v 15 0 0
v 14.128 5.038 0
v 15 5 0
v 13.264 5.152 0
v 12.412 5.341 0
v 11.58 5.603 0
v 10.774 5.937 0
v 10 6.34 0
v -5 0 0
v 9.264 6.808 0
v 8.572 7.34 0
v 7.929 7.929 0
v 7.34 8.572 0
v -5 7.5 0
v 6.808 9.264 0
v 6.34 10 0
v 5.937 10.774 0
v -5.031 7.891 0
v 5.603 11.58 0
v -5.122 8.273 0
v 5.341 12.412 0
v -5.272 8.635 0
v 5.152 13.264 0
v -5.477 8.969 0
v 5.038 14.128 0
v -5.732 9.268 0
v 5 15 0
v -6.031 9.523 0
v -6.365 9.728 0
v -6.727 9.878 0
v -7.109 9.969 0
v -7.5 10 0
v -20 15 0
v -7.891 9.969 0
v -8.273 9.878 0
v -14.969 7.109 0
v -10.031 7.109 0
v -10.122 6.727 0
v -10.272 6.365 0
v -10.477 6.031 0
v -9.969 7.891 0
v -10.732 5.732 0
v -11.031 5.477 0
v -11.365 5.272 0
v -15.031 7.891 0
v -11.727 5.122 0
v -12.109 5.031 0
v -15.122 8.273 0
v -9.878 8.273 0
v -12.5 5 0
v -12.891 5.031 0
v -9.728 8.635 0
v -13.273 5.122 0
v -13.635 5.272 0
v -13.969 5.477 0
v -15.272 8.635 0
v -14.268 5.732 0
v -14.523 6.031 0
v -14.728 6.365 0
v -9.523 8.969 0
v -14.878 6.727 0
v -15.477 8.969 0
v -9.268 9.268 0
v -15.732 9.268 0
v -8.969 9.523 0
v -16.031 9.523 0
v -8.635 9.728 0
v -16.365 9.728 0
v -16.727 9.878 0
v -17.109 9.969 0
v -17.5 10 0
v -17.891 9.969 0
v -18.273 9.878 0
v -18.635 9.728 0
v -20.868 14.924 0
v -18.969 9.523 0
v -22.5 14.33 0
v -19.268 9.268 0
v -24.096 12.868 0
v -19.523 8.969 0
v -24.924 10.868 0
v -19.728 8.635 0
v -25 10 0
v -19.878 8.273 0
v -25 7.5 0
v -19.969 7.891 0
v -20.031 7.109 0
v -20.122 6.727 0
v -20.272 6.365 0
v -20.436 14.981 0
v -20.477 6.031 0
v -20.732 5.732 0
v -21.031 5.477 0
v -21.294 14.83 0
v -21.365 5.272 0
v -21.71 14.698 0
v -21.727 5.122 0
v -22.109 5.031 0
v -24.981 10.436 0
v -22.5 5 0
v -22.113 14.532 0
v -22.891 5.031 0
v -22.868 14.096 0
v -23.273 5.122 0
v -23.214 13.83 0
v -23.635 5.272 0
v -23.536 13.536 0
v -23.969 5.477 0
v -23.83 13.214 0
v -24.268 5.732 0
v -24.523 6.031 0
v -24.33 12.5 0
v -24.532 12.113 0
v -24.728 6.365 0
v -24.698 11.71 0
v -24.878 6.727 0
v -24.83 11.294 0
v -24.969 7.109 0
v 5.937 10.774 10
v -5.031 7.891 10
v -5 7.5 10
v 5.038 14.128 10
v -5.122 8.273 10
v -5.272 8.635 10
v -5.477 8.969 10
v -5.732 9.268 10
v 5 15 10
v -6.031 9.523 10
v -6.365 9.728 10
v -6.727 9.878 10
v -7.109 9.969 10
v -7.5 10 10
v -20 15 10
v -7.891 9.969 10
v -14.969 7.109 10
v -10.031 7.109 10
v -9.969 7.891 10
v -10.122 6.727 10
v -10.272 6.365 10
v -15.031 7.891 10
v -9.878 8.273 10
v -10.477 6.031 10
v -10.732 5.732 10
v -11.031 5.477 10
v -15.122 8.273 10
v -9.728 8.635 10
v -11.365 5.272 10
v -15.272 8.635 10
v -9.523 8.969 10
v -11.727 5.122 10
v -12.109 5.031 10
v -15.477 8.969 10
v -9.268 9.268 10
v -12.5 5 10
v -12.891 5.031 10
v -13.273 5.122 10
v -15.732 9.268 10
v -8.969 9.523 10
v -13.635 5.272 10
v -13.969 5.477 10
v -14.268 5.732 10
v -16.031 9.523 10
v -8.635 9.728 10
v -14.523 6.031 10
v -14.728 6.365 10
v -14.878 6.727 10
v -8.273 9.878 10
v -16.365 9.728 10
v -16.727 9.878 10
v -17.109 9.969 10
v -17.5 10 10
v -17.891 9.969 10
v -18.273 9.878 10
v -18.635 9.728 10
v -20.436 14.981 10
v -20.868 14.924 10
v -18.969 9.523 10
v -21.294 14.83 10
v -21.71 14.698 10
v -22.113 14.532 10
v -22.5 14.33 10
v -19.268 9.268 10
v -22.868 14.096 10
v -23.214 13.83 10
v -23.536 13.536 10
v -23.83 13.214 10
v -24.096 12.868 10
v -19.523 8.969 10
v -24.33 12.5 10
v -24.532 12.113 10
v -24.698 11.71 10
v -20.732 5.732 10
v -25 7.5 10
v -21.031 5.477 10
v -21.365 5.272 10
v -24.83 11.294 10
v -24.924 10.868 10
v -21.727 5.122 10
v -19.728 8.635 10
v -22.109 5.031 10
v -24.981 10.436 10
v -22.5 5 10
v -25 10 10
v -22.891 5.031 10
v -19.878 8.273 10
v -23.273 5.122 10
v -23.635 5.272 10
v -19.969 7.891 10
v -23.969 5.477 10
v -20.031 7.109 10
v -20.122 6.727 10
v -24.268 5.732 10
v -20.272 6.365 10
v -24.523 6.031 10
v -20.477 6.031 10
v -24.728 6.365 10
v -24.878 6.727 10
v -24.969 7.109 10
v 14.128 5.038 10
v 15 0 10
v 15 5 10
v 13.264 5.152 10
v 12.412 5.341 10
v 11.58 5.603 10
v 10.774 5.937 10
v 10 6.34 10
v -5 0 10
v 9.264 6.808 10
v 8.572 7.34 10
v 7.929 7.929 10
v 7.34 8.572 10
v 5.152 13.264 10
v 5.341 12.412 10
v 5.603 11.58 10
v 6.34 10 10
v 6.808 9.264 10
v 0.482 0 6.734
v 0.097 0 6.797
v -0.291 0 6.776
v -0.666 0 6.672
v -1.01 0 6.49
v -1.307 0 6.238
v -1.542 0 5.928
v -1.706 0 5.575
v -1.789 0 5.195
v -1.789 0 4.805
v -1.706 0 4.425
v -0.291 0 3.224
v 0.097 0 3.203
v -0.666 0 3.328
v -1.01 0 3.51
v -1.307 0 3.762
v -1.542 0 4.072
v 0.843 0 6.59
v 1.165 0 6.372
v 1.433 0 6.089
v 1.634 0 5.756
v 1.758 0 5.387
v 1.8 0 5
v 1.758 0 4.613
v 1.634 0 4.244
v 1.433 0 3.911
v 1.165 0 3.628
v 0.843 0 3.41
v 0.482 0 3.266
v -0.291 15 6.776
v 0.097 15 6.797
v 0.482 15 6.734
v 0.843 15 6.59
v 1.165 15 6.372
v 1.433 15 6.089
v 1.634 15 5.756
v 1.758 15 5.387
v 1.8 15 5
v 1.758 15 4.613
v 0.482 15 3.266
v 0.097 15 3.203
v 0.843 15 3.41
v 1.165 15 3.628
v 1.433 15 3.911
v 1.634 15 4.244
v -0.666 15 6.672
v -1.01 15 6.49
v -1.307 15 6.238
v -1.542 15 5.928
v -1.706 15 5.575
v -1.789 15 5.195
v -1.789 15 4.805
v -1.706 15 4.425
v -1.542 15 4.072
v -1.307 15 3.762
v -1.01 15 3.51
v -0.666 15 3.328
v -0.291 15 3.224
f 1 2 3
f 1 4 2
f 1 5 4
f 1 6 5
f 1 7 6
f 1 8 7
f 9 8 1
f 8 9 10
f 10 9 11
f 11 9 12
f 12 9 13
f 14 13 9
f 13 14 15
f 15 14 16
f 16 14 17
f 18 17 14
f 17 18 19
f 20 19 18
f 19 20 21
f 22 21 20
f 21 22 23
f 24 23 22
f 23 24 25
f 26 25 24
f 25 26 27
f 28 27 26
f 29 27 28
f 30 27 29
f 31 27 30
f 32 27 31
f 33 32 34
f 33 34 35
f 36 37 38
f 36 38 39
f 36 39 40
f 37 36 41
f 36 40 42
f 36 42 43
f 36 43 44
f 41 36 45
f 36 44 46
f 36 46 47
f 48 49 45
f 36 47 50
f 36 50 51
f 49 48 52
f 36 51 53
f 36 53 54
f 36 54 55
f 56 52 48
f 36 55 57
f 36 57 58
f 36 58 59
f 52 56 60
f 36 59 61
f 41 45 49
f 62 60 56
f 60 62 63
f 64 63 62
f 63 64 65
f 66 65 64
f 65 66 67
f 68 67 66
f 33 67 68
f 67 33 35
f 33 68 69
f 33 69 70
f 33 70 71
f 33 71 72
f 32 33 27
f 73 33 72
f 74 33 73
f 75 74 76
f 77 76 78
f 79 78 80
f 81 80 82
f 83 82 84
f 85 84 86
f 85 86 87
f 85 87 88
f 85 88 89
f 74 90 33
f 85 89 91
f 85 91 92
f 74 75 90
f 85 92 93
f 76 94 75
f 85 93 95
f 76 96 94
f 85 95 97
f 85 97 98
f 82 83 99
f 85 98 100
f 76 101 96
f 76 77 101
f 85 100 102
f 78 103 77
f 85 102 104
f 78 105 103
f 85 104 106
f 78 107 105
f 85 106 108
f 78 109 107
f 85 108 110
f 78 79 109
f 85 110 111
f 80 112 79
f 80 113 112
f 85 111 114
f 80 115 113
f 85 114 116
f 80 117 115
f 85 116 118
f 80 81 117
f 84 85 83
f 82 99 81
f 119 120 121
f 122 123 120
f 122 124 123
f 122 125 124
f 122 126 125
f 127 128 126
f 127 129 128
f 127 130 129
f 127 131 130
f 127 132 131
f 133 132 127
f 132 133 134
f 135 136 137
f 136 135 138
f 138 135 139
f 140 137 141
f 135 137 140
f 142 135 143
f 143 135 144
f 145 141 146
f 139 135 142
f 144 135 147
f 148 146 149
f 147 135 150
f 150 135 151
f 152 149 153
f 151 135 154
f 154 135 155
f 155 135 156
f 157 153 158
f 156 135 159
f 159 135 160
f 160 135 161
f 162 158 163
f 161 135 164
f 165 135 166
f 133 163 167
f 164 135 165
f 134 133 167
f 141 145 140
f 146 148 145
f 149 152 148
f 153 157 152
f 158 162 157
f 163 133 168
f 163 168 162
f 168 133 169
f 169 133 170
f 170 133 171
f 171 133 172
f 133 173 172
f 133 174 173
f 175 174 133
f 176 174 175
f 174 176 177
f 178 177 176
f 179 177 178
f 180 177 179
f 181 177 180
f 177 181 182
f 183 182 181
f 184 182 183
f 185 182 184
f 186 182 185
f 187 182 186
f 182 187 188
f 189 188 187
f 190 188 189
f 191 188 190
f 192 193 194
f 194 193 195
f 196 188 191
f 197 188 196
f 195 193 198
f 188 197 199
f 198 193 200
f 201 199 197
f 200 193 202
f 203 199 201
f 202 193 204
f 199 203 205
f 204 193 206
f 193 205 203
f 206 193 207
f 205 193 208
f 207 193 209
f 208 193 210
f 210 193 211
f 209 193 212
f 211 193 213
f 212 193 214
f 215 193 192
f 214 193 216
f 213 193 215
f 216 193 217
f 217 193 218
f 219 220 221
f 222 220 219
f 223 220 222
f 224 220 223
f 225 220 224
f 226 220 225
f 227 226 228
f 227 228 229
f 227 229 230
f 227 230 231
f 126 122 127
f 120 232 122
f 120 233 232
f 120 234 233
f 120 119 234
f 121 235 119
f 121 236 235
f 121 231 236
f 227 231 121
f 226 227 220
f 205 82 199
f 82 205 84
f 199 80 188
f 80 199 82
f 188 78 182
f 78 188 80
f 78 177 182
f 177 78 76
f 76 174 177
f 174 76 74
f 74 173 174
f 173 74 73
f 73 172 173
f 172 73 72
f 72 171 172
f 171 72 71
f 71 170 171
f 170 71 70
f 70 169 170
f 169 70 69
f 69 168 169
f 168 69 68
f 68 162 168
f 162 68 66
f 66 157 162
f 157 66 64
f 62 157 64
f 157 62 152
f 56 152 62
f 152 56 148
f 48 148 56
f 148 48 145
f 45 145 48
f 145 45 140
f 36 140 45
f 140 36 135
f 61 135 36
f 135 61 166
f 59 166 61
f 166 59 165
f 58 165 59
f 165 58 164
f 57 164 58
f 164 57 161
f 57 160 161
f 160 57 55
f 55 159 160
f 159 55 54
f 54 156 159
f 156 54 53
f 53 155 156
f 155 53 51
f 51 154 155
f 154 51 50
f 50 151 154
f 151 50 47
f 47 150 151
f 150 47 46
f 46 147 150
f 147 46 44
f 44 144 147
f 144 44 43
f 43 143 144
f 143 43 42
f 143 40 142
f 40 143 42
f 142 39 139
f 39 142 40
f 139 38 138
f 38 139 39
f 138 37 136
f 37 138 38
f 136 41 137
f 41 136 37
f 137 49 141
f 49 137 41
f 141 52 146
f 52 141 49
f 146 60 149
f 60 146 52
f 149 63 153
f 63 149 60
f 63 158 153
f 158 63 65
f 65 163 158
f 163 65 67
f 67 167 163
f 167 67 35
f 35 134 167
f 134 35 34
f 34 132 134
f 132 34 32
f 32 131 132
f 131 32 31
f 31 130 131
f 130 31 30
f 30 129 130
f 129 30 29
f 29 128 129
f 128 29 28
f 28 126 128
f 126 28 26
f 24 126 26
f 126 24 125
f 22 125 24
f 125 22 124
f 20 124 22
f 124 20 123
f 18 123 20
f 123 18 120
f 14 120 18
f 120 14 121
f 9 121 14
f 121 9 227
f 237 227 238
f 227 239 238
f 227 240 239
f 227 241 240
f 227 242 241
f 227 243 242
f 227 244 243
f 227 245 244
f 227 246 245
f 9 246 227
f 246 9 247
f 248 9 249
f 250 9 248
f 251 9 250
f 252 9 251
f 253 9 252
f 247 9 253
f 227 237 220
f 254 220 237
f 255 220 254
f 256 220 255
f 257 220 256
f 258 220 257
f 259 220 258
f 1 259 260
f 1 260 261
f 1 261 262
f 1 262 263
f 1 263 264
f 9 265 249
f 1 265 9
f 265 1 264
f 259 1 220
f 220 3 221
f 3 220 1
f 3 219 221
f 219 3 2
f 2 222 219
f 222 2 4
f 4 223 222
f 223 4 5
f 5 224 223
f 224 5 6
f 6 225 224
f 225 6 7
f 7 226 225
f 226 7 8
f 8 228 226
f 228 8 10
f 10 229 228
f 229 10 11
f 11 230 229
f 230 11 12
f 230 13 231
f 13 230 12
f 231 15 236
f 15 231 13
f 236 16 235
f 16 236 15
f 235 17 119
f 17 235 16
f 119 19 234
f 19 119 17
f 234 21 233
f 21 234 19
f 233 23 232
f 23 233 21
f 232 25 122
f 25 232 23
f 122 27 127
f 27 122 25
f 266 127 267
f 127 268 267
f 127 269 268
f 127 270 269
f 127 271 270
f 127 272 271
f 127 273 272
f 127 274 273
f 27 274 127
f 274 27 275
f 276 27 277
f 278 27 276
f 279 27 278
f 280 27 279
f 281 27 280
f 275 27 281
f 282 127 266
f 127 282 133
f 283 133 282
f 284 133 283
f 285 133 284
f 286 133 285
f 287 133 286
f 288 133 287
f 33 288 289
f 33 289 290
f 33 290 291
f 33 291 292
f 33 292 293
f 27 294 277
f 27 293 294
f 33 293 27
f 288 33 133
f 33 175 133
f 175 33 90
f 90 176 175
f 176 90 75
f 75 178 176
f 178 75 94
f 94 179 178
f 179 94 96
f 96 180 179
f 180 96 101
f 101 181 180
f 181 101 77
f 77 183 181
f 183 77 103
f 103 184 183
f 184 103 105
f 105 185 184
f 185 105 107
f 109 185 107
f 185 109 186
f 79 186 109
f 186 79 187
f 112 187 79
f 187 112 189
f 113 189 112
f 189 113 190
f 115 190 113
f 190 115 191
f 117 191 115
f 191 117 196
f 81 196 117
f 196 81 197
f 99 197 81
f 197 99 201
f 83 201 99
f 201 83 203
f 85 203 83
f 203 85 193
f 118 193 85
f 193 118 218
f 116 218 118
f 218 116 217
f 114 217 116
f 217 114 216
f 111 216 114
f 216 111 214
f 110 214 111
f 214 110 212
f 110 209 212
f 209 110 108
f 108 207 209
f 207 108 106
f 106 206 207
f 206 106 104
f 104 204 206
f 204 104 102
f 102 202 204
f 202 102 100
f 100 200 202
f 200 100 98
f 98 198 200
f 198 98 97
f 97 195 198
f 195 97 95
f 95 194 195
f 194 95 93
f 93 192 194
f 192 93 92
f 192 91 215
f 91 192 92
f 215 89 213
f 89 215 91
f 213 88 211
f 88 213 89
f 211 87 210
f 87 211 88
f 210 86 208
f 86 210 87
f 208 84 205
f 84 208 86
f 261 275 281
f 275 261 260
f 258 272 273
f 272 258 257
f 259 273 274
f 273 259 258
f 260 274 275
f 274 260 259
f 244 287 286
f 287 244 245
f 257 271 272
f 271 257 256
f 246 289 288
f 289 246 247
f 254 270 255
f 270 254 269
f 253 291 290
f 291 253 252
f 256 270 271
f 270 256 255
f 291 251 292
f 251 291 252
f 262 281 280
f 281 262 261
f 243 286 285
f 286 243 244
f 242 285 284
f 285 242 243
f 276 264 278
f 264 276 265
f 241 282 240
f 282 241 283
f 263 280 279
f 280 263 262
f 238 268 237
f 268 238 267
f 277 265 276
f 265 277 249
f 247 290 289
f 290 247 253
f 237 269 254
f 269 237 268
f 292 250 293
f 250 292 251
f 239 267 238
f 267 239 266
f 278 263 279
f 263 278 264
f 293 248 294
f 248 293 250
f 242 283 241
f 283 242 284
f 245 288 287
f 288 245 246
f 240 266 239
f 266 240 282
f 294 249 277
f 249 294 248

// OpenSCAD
//$fn=60;
$fa=5;
$fs=.4;

d1 = 3.6;
m1 = 2.5;
d2 = 5.2;
m2 = 2.5;
l1 = 22;
h1 = 3;
h2 = 2;
hi = 5;

//spk_insert();
hook();



module hook(){
    difference(){
        hook_body();
        hook_hole();
    }
}

module hook_body(){
    linear_extrude(height=10) difference(){
        union(){
            translate([-20,10]) square([20,5]);
            translate([-25,7.5]) square([25,2.5]);
            translate([-5,0]) square([5,10]);
            
            translate([-22.5,7.5]) circle(d=5);
            translate([-12.5,7.5]) circle(d=5);
            
            translate([-20,10]) difference(){
                circle(d=10);
                square([5,5]);
                translate([-5,-5]) square([10,5]);
            }
            
            difference(){
                square([15,15]);
                translate([15,15]) circle(d=20);
            }
        }
        translate([-7.5,7.5]) circle(d=5);
        translate([-17.5,7.5]) circle(d=5);
    }
}

module hook_hole(){
    translate([0,0,5])  
        rotate([90,0,0])
            translate([0,0,-20])
                linear_extrude(height=40) circle(d=3.6);
}


module spk_insert(){
    difference(){
        union(){
            linear_extrude(height=h1) hull(){
                translate([-l1/2,0]) circle(d=m1*d1);
                translate([l1/2,0]) circle(d=m1*d1);
                circle(d=m2*d2);
            }
            linear_extrude(height=h2+hi) circle(d=m2*d2);
        }
        
        translate([0,0,-1]) linear_extrude(height=15) circle(d=d1);
        translate([-l1/2,0,-1]) linear_extrude(height=15) circle(d=d1);
        translate([l1/2,0,-1]) linear_extrude(height=15) circle(d=d1);
        translate([0,0,h2]) linear_extrude(height=15) circle(d=d2);
    }
}
